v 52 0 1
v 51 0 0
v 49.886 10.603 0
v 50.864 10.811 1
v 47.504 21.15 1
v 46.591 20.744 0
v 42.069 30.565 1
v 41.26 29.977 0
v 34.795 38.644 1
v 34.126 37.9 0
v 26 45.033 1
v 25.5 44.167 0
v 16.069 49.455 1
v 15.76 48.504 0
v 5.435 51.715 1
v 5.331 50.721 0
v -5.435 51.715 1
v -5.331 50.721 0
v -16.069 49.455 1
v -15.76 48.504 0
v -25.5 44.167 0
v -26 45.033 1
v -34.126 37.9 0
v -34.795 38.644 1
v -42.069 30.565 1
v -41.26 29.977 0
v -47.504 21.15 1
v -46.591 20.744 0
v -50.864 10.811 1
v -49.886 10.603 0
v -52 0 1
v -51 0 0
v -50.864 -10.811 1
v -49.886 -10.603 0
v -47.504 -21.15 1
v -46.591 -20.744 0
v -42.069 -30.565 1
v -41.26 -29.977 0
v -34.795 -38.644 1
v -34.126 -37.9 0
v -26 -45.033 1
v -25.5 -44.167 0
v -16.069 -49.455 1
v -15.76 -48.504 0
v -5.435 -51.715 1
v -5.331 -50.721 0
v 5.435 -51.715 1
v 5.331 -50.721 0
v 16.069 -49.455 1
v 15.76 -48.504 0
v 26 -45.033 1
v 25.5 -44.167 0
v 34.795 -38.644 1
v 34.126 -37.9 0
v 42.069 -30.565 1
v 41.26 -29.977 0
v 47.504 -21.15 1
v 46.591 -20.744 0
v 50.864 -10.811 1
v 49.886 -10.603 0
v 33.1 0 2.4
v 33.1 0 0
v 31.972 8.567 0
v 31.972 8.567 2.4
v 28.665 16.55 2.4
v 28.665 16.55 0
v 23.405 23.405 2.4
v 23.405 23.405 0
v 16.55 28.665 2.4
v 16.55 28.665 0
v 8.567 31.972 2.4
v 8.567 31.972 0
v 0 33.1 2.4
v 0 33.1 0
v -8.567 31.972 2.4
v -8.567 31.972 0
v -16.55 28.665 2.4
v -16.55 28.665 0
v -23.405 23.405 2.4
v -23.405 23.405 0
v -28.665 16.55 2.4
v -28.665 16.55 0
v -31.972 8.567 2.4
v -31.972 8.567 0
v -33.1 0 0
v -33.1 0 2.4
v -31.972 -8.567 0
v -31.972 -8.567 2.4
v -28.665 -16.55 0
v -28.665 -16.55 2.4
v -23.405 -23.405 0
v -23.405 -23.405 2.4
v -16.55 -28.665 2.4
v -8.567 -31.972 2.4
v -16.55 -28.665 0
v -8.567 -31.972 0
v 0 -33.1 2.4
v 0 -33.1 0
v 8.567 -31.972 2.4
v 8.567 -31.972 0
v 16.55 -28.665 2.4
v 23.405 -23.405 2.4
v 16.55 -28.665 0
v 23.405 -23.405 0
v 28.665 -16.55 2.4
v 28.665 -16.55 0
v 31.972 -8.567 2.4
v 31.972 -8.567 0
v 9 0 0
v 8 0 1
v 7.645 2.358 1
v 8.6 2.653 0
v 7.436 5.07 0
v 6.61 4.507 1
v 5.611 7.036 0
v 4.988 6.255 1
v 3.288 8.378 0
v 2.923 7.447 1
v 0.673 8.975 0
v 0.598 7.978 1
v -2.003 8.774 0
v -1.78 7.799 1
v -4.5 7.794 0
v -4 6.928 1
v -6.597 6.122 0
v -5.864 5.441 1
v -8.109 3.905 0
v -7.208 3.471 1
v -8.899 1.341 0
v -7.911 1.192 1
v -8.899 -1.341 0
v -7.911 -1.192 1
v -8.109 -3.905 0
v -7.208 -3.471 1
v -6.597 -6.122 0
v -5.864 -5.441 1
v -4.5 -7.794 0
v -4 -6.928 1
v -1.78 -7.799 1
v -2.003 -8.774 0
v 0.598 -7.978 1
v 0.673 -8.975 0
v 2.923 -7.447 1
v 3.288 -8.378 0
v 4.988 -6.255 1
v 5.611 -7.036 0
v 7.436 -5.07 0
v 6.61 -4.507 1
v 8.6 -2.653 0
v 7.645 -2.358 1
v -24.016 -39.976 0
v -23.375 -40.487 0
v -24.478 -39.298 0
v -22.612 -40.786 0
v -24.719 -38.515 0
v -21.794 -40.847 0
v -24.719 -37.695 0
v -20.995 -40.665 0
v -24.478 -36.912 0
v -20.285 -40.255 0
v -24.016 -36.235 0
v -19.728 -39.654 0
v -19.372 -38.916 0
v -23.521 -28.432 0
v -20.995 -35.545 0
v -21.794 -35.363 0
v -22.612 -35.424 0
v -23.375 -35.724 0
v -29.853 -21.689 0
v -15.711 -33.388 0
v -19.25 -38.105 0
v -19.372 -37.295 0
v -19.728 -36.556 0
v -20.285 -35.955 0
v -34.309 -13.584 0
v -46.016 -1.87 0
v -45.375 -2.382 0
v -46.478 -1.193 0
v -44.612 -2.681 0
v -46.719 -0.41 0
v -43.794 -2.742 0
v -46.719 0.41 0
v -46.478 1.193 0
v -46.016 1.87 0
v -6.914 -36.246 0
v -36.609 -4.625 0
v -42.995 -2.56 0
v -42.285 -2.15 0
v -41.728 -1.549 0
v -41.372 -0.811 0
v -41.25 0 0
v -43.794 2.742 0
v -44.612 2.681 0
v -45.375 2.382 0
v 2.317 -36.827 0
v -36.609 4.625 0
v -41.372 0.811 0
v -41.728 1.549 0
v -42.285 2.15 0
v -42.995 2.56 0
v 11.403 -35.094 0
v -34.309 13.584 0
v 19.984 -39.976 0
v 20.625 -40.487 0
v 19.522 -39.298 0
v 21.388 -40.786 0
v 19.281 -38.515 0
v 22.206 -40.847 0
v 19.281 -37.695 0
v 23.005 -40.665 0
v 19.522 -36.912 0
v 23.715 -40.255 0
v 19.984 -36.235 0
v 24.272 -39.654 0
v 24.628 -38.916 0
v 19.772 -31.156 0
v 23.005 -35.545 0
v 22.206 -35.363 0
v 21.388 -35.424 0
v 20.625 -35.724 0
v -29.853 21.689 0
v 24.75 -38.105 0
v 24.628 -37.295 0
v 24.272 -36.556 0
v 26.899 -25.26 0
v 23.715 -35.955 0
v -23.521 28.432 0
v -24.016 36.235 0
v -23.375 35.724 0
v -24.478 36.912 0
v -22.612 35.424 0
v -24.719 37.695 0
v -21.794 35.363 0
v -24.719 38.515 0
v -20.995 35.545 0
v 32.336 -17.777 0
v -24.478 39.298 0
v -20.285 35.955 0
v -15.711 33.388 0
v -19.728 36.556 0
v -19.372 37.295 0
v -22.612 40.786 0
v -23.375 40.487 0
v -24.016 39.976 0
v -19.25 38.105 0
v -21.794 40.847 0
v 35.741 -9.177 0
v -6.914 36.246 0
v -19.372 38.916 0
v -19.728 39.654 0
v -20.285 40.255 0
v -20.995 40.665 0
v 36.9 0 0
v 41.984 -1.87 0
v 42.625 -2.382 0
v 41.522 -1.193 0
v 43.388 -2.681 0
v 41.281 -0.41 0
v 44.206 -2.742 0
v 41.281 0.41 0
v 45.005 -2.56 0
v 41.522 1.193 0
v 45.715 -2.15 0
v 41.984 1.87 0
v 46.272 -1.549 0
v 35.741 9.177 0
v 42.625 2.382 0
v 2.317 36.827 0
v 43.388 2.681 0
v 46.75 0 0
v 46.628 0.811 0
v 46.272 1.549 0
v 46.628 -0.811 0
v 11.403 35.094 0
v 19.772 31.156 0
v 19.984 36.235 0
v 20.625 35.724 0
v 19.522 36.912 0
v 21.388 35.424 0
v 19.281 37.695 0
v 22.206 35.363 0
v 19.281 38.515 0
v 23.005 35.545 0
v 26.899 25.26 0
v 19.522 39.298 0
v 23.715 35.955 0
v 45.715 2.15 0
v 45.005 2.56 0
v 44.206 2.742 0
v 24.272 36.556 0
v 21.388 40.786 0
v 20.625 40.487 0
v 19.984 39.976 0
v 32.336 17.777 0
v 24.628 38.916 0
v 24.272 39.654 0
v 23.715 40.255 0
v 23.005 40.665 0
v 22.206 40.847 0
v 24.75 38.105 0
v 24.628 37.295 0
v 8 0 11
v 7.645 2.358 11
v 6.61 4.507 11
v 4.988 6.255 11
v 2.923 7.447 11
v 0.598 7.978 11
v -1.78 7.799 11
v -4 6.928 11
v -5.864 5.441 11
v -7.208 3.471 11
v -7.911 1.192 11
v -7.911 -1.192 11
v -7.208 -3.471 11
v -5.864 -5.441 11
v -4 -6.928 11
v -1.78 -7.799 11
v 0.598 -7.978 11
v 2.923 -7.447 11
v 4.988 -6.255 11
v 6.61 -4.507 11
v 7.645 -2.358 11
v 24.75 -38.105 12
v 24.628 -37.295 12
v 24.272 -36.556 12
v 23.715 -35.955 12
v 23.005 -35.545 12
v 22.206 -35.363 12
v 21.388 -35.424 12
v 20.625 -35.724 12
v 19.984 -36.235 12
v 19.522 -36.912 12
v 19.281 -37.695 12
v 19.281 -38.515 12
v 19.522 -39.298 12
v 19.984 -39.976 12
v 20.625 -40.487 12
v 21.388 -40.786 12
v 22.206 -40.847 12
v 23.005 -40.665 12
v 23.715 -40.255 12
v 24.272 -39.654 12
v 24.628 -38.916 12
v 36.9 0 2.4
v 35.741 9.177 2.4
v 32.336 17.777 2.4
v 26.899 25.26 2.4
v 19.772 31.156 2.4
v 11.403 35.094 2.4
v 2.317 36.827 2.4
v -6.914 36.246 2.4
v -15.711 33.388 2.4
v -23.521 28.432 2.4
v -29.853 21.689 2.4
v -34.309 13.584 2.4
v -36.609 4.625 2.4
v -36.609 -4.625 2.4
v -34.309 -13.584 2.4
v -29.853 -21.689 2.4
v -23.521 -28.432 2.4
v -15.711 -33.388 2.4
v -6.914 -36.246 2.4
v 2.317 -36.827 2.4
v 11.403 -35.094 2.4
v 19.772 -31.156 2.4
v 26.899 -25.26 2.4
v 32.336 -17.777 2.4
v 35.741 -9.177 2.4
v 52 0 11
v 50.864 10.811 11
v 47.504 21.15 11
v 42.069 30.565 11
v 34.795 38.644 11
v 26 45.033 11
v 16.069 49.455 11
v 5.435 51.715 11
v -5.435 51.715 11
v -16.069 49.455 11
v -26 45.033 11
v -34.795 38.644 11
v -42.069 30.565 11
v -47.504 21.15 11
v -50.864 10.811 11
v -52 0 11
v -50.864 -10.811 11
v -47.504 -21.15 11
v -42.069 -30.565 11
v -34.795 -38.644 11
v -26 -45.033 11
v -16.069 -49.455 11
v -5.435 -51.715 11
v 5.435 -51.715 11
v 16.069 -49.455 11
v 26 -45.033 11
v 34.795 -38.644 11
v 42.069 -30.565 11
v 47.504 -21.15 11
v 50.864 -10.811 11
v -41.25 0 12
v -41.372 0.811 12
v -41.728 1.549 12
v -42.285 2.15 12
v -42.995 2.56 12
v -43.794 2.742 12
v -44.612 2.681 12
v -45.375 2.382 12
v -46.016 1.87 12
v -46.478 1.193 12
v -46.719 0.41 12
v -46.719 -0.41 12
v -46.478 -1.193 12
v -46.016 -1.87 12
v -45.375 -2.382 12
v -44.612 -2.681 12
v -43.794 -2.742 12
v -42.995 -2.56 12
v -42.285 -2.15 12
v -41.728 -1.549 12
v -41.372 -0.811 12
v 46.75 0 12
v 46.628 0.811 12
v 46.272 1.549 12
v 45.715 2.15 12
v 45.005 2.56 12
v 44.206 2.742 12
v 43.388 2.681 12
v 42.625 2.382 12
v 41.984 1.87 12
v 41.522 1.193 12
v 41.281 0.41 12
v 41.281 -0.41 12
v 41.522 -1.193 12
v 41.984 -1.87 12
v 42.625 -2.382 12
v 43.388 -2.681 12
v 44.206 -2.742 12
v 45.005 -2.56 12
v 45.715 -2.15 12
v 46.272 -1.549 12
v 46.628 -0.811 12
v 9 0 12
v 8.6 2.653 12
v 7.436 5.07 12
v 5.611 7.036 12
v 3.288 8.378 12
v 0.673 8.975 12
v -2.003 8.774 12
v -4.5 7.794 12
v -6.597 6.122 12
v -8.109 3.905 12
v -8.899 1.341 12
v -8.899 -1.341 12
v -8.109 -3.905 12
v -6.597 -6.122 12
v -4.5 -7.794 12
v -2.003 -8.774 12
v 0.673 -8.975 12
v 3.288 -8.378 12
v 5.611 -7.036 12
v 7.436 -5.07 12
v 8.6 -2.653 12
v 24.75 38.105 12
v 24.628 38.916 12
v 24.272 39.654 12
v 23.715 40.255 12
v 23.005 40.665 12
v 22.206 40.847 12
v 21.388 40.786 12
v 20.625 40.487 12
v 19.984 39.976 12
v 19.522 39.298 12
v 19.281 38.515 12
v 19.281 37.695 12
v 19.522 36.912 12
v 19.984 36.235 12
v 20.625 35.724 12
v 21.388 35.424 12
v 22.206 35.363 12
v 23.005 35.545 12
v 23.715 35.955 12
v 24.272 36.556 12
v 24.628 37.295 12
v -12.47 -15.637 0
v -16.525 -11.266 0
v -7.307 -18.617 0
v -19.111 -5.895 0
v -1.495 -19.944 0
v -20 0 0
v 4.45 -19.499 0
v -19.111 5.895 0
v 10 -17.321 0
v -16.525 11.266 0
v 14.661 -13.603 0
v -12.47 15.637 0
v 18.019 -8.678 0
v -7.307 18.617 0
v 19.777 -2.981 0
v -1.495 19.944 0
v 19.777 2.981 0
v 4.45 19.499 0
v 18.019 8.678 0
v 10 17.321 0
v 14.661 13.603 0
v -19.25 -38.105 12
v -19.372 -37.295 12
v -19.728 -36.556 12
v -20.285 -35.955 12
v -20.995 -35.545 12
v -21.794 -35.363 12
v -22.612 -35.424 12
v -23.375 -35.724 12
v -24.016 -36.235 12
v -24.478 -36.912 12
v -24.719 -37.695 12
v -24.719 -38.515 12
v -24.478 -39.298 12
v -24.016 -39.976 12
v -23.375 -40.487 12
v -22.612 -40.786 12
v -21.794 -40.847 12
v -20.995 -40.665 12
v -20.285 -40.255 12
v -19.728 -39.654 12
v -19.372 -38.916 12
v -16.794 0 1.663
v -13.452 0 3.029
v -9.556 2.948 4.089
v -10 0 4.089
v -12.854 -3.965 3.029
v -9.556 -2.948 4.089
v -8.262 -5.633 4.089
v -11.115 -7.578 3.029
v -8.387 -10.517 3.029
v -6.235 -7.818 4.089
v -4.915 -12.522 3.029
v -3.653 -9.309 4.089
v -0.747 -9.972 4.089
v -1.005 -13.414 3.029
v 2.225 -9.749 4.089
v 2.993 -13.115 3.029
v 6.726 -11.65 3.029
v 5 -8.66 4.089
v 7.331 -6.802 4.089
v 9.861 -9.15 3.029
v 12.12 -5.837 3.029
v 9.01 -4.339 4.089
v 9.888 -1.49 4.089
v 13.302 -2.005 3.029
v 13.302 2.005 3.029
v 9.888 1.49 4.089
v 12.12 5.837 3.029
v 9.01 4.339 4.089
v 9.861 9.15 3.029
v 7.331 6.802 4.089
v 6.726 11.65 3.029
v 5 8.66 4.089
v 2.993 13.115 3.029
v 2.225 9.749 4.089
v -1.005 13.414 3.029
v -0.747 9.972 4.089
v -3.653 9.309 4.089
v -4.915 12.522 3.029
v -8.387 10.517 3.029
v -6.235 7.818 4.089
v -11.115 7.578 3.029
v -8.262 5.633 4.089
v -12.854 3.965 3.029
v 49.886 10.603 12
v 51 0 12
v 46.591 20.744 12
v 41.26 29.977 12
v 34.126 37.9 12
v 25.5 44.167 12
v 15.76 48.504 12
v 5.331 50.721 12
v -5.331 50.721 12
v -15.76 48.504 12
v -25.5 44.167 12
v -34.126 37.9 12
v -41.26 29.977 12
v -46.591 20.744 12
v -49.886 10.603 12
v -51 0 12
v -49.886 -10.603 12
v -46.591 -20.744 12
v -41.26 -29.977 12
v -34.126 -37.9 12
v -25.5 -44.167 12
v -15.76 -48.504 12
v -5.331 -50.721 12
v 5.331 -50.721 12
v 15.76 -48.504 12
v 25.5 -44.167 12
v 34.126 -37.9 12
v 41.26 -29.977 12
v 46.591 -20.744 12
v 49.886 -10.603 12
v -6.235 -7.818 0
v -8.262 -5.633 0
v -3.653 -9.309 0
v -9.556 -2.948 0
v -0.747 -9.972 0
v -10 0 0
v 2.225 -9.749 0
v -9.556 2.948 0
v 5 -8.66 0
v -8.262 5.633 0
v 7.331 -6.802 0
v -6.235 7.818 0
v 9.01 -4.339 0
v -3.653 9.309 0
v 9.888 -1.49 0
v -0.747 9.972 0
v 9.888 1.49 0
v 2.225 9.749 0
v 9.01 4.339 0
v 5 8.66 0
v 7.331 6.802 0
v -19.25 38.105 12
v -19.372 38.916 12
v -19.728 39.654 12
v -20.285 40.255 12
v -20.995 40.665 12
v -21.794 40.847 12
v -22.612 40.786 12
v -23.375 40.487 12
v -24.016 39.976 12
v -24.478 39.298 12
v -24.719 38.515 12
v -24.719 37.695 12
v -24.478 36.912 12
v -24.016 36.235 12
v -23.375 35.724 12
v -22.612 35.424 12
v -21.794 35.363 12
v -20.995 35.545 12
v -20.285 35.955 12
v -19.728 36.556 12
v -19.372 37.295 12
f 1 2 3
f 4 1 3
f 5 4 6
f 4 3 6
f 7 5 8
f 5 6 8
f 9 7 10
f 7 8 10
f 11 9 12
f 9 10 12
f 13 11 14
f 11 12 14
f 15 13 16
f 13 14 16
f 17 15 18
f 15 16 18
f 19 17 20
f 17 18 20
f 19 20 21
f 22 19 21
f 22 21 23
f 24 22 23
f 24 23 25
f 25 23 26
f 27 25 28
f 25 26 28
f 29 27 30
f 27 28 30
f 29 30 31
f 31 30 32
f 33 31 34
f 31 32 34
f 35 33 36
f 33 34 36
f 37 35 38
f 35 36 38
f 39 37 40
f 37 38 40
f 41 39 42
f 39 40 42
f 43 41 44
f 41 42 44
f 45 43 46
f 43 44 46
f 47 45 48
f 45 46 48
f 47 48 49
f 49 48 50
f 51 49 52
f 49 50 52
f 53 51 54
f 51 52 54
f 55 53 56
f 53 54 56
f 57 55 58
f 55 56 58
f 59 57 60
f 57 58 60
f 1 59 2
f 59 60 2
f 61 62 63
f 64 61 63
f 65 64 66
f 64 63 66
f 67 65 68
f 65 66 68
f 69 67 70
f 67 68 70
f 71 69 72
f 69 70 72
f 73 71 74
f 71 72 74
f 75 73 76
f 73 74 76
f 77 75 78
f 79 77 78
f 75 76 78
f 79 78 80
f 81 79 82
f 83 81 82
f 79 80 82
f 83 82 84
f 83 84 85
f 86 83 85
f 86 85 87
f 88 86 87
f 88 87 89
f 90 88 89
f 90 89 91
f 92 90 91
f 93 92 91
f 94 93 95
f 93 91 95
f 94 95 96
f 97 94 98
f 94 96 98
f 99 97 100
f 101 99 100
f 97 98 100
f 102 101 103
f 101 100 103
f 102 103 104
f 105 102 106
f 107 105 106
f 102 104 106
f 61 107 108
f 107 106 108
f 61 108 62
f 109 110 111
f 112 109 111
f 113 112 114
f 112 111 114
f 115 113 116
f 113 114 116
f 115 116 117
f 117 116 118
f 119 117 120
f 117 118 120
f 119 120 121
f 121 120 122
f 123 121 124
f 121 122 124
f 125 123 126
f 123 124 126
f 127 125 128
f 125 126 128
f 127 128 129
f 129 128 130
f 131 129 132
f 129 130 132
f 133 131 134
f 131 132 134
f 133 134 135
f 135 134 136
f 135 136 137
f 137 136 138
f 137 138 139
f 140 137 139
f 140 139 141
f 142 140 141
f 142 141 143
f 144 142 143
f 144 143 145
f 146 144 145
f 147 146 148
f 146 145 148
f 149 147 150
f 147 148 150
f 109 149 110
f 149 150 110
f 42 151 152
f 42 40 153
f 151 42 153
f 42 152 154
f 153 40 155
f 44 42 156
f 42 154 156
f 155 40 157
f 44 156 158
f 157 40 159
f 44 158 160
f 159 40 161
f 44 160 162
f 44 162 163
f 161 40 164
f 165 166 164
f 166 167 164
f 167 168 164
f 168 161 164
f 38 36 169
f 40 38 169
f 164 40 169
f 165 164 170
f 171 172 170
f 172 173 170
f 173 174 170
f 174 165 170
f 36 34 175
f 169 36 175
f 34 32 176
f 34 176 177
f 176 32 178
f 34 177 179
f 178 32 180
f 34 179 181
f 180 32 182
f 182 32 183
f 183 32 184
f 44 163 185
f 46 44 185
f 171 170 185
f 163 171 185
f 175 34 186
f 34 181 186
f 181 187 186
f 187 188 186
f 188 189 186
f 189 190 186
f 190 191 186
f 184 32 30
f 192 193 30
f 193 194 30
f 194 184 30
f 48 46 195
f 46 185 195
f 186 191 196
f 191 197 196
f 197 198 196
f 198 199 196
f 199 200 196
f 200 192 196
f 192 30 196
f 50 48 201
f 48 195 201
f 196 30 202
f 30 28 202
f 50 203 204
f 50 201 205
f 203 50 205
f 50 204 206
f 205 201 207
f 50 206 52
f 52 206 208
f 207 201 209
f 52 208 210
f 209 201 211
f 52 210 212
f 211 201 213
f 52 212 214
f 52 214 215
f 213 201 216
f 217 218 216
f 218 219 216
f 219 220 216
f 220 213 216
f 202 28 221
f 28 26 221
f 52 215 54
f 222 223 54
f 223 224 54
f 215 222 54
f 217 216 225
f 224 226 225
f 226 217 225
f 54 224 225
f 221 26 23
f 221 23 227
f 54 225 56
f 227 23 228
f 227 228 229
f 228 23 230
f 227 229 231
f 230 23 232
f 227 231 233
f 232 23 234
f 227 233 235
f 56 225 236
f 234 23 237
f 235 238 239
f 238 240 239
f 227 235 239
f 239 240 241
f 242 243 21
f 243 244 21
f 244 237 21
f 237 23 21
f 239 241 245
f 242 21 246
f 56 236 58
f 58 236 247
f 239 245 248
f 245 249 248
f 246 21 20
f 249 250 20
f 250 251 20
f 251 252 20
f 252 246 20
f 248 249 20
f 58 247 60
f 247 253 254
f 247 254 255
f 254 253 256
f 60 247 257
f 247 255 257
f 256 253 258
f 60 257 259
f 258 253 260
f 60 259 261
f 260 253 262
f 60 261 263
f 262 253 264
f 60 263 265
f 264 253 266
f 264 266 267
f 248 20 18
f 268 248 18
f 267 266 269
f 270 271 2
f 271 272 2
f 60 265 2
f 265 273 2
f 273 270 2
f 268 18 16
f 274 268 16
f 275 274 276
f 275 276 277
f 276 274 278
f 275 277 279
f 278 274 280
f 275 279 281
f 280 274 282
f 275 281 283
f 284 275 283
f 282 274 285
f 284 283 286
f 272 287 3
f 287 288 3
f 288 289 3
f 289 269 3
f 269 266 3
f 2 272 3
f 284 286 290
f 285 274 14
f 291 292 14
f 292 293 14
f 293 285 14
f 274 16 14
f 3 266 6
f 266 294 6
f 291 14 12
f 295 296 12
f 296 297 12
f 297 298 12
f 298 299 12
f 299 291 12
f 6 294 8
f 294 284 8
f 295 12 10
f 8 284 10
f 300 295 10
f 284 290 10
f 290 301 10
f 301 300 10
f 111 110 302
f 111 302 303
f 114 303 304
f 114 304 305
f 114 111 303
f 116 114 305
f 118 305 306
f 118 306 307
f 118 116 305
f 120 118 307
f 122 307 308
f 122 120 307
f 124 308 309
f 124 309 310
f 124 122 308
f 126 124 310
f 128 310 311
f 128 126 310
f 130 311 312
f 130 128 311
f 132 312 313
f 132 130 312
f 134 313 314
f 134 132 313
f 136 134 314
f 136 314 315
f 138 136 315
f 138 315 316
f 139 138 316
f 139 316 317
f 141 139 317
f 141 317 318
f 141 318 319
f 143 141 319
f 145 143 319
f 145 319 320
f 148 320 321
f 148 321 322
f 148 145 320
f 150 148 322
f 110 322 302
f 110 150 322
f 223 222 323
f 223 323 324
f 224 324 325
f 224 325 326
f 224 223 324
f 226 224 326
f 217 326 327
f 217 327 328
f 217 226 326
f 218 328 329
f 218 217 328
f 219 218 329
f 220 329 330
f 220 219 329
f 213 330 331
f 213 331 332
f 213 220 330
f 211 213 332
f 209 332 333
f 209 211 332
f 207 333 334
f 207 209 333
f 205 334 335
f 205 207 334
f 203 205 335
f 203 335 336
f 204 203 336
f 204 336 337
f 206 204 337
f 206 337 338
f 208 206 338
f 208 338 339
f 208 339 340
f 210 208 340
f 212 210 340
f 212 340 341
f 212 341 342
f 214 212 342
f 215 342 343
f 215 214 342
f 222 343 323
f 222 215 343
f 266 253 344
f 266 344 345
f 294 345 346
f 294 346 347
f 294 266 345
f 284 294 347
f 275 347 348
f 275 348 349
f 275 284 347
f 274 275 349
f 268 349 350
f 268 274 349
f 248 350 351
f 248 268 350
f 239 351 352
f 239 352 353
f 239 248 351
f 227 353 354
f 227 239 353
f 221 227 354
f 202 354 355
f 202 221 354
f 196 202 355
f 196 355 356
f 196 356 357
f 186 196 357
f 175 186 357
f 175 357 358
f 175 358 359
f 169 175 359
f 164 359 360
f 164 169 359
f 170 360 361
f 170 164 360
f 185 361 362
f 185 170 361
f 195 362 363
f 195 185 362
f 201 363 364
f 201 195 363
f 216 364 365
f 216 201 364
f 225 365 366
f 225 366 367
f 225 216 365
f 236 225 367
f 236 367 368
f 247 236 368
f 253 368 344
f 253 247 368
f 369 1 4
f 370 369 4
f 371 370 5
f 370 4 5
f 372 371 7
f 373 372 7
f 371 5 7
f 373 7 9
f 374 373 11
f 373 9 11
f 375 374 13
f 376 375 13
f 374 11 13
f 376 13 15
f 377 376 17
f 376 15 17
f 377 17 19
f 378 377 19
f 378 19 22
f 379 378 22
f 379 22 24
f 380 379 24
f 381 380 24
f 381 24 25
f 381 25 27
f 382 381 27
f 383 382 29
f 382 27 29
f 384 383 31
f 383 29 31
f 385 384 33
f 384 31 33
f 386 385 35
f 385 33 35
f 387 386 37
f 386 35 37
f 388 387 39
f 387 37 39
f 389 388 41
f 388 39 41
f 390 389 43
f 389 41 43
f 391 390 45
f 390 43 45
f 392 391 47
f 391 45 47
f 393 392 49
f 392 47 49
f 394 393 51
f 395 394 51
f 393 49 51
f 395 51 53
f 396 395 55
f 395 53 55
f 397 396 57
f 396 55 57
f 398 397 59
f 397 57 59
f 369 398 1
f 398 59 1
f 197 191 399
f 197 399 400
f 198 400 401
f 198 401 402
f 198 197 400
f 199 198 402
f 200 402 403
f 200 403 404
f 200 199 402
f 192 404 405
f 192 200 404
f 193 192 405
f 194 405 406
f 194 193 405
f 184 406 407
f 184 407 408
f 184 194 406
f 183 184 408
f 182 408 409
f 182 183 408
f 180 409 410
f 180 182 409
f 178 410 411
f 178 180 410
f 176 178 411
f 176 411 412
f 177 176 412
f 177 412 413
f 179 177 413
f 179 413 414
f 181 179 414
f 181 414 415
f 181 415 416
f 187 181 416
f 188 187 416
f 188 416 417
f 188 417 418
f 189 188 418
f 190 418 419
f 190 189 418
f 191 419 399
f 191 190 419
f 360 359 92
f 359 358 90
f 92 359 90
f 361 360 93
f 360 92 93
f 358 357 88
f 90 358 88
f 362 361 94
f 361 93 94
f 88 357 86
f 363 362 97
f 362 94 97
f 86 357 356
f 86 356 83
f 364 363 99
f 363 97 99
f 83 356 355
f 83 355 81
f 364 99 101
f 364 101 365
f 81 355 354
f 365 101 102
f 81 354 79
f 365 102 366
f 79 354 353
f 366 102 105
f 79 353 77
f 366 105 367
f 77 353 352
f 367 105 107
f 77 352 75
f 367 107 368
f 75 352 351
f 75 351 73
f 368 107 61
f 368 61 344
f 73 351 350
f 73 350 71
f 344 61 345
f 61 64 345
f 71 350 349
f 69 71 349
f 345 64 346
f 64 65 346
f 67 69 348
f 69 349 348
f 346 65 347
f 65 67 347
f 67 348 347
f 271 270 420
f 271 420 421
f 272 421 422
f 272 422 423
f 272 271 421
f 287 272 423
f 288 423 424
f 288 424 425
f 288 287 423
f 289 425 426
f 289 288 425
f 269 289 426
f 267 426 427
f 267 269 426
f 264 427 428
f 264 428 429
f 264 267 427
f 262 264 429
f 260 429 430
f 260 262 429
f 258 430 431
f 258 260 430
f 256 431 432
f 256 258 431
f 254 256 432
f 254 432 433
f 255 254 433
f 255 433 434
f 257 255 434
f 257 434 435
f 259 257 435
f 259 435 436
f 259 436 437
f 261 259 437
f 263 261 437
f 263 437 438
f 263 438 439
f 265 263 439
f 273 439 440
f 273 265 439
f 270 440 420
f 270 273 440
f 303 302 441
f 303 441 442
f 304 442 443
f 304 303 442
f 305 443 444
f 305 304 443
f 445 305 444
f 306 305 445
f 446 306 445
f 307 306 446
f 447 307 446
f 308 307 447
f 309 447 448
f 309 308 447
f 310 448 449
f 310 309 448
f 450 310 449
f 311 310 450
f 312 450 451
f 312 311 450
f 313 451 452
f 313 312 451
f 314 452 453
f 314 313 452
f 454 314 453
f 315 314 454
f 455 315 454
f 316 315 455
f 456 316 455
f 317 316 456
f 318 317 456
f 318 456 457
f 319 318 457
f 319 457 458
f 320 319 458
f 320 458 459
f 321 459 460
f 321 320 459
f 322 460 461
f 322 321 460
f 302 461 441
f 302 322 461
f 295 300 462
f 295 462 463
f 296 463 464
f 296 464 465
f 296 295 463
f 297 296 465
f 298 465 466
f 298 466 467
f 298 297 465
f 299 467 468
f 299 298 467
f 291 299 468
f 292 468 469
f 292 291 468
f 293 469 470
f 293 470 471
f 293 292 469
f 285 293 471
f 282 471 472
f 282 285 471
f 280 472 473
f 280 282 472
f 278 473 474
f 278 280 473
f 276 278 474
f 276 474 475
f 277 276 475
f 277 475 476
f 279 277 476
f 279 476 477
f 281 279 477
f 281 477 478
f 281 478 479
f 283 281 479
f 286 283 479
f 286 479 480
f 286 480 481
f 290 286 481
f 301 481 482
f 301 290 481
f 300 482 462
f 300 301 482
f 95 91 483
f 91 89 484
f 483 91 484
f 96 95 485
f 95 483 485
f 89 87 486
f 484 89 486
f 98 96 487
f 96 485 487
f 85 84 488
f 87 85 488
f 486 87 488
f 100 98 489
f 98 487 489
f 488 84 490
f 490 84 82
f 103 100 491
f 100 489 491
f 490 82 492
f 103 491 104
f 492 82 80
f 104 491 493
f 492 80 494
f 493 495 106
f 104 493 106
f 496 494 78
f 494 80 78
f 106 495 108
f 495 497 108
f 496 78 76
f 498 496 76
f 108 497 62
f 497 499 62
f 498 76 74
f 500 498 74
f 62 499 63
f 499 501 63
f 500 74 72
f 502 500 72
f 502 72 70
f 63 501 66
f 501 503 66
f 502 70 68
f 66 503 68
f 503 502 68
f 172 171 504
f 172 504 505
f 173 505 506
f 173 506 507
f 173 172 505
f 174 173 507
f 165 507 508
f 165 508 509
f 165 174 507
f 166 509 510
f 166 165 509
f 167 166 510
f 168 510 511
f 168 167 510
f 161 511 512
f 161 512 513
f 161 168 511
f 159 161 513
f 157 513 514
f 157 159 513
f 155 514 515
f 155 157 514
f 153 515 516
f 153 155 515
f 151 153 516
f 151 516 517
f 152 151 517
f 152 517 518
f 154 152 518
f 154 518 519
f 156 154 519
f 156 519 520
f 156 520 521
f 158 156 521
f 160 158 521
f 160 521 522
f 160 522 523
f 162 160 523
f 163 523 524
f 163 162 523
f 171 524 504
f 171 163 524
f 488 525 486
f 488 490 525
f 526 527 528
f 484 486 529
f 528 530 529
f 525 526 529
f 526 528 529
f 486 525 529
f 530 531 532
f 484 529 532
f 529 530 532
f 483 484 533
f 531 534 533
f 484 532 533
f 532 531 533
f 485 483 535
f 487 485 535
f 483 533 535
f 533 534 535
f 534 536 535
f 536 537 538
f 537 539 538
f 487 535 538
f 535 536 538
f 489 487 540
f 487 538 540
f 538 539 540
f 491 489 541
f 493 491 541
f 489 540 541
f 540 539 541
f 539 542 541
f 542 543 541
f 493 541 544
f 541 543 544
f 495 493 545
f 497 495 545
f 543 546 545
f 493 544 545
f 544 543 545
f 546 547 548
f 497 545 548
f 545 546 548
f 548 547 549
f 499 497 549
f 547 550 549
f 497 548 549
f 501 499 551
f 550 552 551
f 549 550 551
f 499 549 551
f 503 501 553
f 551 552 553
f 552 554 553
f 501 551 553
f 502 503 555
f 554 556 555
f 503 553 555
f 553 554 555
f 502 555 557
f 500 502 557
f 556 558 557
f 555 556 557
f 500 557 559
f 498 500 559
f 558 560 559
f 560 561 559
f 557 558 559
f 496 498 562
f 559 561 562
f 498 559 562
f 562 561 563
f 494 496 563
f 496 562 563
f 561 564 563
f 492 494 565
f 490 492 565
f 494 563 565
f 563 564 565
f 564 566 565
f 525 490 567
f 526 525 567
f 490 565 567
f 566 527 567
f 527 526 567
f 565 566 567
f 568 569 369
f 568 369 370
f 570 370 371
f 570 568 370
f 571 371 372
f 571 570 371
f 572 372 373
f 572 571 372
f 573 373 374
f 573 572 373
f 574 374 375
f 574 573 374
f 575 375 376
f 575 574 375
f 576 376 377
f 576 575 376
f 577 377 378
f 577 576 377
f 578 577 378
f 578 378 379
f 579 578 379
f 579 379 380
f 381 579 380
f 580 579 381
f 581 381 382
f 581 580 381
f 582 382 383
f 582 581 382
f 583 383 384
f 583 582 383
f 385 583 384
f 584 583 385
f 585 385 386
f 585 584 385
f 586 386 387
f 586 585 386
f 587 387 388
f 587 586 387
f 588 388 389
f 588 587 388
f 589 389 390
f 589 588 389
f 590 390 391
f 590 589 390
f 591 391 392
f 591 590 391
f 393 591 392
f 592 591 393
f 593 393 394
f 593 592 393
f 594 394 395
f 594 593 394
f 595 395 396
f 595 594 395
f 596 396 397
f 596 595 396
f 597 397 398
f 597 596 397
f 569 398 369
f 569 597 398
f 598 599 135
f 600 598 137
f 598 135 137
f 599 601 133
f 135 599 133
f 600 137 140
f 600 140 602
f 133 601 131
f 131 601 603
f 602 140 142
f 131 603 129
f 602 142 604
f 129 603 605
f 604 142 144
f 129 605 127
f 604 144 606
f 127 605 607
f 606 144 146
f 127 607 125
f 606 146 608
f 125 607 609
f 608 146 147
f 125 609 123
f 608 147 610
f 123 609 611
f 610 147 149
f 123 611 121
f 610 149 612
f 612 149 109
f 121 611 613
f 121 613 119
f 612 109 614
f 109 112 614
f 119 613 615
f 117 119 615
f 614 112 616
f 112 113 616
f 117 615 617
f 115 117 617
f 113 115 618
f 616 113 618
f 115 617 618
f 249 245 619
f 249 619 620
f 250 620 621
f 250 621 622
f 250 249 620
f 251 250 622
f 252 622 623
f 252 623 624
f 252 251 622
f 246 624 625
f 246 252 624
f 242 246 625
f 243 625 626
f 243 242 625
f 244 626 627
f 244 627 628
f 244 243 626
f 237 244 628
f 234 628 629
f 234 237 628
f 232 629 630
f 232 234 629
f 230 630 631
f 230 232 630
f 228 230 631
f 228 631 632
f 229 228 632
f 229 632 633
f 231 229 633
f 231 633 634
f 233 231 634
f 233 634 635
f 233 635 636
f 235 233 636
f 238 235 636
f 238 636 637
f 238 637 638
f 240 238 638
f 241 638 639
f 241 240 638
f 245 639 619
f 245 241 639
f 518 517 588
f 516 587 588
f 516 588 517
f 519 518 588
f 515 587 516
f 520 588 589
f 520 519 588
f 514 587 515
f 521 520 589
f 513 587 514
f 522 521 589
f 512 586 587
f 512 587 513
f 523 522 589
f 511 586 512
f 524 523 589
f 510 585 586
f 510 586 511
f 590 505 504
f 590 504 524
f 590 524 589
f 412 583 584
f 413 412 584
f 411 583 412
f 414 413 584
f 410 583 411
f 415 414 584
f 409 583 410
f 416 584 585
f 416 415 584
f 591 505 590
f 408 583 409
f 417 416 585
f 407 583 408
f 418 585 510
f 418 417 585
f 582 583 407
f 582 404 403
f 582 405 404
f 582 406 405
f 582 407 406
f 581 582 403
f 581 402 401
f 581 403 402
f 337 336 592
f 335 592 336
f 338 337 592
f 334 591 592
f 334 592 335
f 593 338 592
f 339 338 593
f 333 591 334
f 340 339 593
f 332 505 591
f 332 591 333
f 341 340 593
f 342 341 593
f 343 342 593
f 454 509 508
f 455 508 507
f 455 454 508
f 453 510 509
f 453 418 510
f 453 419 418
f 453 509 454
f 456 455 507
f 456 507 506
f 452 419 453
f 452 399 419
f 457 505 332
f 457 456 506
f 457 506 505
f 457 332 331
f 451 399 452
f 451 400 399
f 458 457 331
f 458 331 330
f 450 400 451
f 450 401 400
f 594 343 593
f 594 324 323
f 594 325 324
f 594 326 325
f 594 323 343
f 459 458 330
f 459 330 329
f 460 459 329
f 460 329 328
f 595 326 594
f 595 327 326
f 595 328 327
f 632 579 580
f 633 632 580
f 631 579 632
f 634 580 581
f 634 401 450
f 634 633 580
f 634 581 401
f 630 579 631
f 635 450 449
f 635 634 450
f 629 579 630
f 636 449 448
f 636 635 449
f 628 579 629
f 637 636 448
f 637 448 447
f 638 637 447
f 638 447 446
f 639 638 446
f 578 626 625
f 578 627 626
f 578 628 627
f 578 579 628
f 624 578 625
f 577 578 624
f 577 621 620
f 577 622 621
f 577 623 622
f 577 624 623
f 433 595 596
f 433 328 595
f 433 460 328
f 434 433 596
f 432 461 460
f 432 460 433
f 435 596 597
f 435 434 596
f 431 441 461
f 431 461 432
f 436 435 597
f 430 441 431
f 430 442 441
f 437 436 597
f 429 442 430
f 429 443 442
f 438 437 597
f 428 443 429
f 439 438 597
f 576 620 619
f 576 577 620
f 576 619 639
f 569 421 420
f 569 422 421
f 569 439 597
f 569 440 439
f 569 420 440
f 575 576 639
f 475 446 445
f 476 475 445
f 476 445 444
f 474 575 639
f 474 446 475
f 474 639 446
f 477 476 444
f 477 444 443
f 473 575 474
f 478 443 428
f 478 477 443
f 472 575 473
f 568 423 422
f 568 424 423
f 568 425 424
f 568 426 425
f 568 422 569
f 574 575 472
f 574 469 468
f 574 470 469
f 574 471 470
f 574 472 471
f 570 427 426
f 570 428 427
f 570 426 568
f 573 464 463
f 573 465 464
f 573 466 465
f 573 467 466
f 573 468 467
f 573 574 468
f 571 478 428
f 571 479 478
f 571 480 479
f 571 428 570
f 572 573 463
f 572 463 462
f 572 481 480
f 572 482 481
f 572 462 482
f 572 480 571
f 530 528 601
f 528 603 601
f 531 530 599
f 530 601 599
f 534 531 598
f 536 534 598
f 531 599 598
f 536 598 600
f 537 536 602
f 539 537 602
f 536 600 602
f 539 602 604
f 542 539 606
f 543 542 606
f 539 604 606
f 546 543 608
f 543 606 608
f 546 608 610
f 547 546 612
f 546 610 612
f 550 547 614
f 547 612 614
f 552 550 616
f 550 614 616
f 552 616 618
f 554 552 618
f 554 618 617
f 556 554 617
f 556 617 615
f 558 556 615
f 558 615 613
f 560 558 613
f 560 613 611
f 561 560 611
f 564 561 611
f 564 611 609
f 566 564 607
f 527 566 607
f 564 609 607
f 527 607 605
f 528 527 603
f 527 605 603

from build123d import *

# Parameters (mm, degrees)
SK_DISC_R          = 52
EXT_DISC_DEPTH     = 12
SK_C16_R           = 8
CUT_C16_DEPTH      = 12
CHAMFER_C1_SIZE    = 1
SK_BOLT88_R        = 2.75
CUT_BOLT88_DEPTH   = 12
SK_GROOVE70_R      = 36.9
SK_GROOVE70_R_2    = 33.1
CUT_GROOVE70_DEPTH = 2.4


with BuildPart() as part:
    # Sk_disc → Ext_disc (new body)
    with BuildSketch(Plane.XY):
        Circle(SK_DISC_R)
    extrude(amount=EXT_DISC_DEPTH)

    # Sk_c16 → Cut_c16 (cut)
    with BuildSketch(Plane.XY):
        Circle(SK_C16_R)
    extrude(amount=CUT_C16_DEPTH, mode=Mode.SUBTRACT)

    # Chamfer_C1
    chamfer_c1_edges = [part.edges().sort_by_distance(p)[0] for p in [
        (-52, 0, 0),
        (-52, 0, 12),
        (-8, 0, 0),
        (-8, 0, 12),
    ]]
    chamfer(chamfer_c1_edges, length=CHAMFER_C1_SIZE)

    # Sk_bolt88 → Cut_bolt88 (cut)
    with BuildSketch(Plane.XY):
        with Locations((44, 0)):
            Circle(SK_BOLT88_R)
        with Locations((22, 38.1051)):
            Circle(SK_BOLT88_R)
        with Locations((-22, 38.1051)):
            Circle(SK_BOLT88_R)
        with Locations((-44, 0)):
            Circle(SK_BOLT88_R)
        with Locations((-22, -38.1051)):
            Circle(SK_BOLT88_R)
        with Locations((22, -38.1051)):
            Circle(SK_BOLT88_R)
    extrude(amount=CUT_BOLT88_DEPTH, mode=Mode.SUBTRACT)

    # Sk_seat → Cut_seatR40 (revolve, cut)
    with BuildSketch(Plane(origin=(0, 0, 0), x_dir=(1, 0, 0), z_dir=(0, 1, 0)), mode=Mode.PRIVATE) as cut_seatr40_sk:
        with BuildLine():
            Line((10, -4.0888), (10, 0))
            Line((10, 0), (20, 0))
            ThreePointArc((20, 0), (15.138690108, -2.383595138), (10, -4.0888))
        make_face()
    revolve(cut_seatr40_sk.sketch.rotate(Axis((0, 0, 0), (0, 0, 1)), 180), axis=Axis((0, 0, 0), (0, 0, 1)), mode=Mode.SUBTRACT)

    # Sk_groove70 → Cut_groove70 (cut)
    with BuildSketch(Plane.XY):
        Circle(SK_GROOVE70_R)
        Circle(SK_GROOVE70_R_2, mode=Mode.SUBTRACT)
    extrude(amount=CUT_GROOVE70_DEPTH, mode=Mode.SUBTRACT)


solid = part.part
